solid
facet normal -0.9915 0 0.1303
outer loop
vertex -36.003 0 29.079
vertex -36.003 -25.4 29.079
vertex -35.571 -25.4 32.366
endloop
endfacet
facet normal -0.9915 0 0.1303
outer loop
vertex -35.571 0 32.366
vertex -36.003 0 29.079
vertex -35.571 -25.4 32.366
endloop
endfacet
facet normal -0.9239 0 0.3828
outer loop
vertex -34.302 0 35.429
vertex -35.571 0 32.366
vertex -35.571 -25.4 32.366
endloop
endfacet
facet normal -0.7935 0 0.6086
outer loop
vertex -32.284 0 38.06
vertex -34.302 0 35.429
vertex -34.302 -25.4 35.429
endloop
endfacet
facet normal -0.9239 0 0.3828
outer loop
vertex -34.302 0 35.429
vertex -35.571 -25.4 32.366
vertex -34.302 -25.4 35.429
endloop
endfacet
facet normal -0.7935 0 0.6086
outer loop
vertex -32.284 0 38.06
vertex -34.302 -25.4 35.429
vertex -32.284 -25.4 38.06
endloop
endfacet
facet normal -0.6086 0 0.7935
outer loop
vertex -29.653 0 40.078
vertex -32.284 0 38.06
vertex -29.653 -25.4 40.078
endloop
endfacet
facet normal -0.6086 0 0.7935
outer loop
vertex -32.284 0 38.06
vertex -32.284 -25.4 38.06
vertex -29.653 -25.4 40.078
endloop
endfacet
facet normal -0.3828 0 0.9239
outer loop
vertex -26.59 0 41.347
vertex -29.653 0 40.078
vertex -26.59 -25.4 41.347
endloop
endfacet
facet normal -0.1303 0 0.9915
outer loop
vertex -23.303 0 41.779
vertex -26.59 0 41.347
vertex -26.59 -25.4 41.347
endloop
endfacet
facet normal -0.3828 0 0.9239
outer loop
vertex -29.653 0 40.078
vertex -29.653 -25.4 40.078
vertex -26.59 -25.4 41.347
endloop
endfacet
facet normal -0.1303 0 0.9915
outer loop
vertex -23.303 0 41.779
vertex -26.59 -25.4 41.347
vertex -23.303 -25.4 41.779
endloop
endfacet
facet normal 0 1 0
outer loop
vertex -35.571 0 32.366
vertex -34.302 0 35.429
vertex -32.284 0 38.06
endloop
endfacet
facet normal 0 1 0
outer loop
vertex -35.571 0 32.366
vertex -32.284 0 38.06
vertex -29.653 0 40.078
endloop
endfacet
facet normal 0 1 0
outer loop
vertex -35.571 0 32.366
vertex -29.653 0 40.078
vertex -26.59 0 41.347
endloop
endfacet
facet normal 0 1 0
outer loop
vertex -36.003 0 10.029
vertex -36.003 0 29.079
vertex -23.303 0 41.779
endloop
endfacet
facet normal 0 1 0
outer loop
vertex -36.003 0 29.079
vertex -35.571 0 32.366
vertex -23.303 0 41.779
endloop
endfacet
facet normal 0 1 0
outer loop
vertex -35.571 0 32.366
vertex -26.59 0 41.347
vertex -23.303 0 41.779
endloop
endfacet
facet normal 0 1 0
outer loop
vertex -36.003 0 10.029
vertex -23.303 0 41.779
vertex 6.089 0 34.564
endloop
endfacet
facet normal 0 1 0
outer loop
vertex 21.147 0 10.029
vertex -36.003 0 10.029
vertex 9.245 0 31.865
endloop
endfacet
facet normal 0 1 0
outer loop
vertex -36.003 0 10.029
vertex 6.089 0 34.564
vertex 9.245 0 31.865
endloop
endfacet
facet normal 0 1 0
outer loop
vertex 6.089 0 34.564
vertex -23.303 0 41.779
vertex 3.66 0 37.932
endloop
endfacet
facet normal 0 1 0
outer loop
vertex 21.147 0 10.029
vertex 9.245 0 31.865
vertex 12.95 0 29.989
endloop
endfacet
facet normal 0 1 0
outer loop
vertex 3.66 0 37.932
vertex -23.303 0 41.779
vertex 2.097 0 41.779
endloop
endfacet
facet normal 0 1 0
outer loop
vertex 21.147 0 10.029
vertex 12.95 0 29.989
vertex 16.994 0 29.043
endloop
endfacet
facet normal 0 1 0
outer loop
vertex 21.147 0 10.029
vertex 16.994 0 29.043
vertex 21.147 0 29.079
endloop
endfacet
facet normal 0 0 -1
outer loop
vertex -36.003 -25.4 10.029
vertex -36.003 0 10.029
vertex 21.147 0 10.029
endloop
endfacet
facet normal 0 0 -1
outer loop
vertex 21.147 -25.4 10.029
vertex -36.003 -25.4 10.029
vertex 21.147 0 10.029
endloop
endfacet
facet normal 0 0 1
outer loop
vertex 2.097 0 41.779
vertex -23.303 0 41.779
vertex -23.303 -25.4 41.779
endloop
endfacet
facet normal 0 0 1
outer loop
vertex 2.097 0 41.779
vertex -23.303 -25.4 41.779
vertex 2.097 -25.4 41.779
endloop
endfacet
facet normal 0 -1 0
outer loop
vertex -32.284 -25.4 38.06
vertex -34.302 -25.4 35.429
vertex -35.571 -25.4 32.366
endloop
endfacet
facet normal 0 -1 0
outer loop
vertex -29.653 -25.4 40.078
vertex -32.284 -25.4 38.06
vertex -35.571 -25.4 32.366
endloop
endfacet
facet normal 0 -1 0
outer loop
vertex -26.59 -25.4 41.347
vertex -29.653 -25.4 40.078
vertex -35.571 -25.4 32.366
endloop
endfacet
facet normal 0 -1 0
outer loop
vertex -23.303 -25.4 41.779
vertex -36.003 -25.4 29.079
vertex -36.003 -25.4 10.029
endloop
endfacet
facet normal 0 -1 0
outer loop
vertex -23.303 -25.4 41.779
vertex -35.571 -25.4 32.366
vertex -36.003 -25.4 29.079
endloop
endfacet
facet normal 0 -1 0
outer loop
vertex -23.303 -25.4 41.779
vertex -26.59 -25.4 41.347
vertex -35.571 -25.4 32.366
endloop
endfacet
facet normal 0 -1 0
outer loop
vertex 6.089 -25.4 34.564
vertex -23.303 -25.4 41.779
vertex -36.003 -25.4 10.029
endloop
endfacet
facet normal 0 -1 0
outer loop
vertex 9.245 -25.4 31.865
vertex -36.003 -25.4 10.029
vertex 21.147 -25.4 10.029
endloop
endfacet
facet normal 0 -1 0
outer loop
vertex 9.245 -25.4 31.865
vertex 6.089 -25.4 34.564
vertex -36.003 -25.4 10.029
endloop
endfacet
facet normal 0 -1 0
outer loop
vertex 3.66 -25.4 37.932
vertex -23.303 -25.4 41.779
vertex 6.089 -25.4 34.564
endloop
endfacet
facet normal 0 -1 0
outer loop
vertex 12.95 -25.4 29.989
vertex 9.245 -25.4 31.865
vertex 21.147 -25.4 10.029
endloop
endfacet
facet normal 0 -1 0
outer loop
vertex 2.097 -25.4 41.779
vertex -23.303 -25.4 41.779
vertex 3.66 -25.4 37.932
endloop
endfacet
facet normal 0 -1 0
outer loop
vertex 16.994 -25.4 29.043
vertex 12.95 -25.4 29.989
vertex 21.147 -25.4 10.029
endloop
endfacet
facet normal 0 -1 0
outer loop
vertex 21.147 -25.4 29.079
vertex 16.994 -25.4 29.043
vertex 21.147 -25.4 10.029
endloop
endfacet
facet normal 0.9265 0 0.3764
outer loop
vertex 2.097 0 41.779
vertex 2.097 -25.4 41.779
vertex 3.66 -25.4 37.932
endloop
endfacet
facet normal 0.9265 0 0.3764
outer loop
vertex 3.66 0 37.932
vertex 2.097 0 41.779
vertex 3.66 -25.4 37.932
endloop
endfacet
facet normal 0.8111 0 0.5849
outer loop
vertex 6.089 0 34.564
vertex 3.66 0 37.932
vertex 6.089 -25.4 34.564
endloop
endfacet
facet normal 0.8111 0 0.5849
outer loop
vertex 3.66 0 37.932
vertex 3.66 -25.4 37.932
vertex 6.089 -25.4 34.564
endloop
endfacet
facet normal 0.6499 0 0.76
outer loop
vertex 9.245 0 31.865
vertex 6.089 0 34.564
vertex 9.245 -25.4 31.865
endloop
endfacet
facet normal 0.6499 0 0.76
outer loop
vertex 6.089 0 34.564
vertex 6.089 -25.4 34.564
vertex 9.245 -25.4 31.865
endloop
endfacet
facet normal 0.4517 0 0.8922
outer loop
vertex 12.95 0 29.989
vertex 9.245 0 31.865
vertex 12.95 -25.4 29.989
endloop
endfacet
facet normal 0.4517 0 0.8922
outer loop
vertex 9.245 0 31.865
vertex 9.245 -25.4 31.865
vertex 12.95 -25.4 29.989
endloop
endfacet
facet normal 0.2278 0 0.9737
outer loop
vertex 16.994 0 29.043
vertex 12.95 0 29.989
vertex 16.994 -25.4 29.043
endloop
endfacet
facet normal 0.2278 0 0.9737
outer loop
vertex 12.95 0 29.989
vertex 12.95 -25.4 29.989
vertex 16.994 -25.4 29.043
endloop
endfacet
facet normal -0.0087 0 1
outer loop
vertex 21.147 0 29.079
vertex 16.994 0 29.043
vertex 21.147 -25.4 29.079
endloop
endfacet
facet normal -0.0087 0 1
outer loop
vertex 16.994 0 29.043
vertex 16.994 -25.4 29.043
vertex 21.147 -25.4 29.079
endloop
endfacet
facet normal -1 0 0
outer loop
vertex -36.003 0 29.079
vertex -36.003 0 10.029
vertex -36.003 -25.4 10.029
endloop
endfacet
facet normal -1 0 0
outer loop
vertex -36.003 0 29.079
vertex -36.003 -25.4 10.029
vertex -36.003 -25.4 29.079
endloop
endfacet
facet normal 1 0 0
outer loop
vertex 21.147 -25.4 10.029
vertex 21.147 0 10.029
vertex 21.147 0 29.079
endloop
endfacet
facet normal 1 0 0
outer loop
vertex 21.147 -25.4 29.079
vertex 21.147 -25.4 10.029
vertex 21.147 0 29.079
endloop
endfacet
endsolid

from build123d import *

# Parameters (mm, degrees)
F0_W     = 57.15
F0_H     = 31.75
F1_DEPTH = 25.4
F3_DEPTH = 25.4
F5_DEPTH = 25.4


with BuildPart() as f1:
    # F0 (on Front) → F1 (new body)
    with BuildSketch(Plane.XZ):
        with Locations((-7.4283964932, 25.9043908785)):
            Rectangle(F0_W, F0_H)
    extrude(amount=F1_DEPTH)

    # F2 (on face) → F3 (cut)
    with BuildSketch(Plane.XZ.offset(25.4)):
        with BuildLine():
            ThreePointArc((2.0966035068, 41.7793908785), (9.2454078798, 31.865097438), (21.1466035068, 29.0793908785))
            Line((21.1466035068, 29.0793908785), (21.1466035068, 41.7793908785))
            Line((21.1466035068, 41.7793908785), (2.0966035068, 41.7793908785))
        make_face()
    extrude(amount=-F3_DEPTH, mode=Mode.SUBTRACT)

    # F4 (on face) → F5 (cut)
    with BuildSketch(Plane.XZ.offset(25.4)):
        with BuildLine():
            Line((-36.0033964932, 41.7793908785), (-36.0033964932, 35.4293908785))
            Line((-36.0033964932, 35.4293908785), (-36.0033964932, 29.0793908785))
            ThreePointArc((-36.0033964932, 29.0793908785), (-32.2836526143, 38.0596469995), (-23.3033964932, 41.7793908785))
            Line((-23.3033964932, 41.7793908785), (-36.0033964932, 41.7793908785))
        make_face()
    extrude(amount=-F5_DEPTH, mode=Mode.SUBTRACT)


solid = f1.part
